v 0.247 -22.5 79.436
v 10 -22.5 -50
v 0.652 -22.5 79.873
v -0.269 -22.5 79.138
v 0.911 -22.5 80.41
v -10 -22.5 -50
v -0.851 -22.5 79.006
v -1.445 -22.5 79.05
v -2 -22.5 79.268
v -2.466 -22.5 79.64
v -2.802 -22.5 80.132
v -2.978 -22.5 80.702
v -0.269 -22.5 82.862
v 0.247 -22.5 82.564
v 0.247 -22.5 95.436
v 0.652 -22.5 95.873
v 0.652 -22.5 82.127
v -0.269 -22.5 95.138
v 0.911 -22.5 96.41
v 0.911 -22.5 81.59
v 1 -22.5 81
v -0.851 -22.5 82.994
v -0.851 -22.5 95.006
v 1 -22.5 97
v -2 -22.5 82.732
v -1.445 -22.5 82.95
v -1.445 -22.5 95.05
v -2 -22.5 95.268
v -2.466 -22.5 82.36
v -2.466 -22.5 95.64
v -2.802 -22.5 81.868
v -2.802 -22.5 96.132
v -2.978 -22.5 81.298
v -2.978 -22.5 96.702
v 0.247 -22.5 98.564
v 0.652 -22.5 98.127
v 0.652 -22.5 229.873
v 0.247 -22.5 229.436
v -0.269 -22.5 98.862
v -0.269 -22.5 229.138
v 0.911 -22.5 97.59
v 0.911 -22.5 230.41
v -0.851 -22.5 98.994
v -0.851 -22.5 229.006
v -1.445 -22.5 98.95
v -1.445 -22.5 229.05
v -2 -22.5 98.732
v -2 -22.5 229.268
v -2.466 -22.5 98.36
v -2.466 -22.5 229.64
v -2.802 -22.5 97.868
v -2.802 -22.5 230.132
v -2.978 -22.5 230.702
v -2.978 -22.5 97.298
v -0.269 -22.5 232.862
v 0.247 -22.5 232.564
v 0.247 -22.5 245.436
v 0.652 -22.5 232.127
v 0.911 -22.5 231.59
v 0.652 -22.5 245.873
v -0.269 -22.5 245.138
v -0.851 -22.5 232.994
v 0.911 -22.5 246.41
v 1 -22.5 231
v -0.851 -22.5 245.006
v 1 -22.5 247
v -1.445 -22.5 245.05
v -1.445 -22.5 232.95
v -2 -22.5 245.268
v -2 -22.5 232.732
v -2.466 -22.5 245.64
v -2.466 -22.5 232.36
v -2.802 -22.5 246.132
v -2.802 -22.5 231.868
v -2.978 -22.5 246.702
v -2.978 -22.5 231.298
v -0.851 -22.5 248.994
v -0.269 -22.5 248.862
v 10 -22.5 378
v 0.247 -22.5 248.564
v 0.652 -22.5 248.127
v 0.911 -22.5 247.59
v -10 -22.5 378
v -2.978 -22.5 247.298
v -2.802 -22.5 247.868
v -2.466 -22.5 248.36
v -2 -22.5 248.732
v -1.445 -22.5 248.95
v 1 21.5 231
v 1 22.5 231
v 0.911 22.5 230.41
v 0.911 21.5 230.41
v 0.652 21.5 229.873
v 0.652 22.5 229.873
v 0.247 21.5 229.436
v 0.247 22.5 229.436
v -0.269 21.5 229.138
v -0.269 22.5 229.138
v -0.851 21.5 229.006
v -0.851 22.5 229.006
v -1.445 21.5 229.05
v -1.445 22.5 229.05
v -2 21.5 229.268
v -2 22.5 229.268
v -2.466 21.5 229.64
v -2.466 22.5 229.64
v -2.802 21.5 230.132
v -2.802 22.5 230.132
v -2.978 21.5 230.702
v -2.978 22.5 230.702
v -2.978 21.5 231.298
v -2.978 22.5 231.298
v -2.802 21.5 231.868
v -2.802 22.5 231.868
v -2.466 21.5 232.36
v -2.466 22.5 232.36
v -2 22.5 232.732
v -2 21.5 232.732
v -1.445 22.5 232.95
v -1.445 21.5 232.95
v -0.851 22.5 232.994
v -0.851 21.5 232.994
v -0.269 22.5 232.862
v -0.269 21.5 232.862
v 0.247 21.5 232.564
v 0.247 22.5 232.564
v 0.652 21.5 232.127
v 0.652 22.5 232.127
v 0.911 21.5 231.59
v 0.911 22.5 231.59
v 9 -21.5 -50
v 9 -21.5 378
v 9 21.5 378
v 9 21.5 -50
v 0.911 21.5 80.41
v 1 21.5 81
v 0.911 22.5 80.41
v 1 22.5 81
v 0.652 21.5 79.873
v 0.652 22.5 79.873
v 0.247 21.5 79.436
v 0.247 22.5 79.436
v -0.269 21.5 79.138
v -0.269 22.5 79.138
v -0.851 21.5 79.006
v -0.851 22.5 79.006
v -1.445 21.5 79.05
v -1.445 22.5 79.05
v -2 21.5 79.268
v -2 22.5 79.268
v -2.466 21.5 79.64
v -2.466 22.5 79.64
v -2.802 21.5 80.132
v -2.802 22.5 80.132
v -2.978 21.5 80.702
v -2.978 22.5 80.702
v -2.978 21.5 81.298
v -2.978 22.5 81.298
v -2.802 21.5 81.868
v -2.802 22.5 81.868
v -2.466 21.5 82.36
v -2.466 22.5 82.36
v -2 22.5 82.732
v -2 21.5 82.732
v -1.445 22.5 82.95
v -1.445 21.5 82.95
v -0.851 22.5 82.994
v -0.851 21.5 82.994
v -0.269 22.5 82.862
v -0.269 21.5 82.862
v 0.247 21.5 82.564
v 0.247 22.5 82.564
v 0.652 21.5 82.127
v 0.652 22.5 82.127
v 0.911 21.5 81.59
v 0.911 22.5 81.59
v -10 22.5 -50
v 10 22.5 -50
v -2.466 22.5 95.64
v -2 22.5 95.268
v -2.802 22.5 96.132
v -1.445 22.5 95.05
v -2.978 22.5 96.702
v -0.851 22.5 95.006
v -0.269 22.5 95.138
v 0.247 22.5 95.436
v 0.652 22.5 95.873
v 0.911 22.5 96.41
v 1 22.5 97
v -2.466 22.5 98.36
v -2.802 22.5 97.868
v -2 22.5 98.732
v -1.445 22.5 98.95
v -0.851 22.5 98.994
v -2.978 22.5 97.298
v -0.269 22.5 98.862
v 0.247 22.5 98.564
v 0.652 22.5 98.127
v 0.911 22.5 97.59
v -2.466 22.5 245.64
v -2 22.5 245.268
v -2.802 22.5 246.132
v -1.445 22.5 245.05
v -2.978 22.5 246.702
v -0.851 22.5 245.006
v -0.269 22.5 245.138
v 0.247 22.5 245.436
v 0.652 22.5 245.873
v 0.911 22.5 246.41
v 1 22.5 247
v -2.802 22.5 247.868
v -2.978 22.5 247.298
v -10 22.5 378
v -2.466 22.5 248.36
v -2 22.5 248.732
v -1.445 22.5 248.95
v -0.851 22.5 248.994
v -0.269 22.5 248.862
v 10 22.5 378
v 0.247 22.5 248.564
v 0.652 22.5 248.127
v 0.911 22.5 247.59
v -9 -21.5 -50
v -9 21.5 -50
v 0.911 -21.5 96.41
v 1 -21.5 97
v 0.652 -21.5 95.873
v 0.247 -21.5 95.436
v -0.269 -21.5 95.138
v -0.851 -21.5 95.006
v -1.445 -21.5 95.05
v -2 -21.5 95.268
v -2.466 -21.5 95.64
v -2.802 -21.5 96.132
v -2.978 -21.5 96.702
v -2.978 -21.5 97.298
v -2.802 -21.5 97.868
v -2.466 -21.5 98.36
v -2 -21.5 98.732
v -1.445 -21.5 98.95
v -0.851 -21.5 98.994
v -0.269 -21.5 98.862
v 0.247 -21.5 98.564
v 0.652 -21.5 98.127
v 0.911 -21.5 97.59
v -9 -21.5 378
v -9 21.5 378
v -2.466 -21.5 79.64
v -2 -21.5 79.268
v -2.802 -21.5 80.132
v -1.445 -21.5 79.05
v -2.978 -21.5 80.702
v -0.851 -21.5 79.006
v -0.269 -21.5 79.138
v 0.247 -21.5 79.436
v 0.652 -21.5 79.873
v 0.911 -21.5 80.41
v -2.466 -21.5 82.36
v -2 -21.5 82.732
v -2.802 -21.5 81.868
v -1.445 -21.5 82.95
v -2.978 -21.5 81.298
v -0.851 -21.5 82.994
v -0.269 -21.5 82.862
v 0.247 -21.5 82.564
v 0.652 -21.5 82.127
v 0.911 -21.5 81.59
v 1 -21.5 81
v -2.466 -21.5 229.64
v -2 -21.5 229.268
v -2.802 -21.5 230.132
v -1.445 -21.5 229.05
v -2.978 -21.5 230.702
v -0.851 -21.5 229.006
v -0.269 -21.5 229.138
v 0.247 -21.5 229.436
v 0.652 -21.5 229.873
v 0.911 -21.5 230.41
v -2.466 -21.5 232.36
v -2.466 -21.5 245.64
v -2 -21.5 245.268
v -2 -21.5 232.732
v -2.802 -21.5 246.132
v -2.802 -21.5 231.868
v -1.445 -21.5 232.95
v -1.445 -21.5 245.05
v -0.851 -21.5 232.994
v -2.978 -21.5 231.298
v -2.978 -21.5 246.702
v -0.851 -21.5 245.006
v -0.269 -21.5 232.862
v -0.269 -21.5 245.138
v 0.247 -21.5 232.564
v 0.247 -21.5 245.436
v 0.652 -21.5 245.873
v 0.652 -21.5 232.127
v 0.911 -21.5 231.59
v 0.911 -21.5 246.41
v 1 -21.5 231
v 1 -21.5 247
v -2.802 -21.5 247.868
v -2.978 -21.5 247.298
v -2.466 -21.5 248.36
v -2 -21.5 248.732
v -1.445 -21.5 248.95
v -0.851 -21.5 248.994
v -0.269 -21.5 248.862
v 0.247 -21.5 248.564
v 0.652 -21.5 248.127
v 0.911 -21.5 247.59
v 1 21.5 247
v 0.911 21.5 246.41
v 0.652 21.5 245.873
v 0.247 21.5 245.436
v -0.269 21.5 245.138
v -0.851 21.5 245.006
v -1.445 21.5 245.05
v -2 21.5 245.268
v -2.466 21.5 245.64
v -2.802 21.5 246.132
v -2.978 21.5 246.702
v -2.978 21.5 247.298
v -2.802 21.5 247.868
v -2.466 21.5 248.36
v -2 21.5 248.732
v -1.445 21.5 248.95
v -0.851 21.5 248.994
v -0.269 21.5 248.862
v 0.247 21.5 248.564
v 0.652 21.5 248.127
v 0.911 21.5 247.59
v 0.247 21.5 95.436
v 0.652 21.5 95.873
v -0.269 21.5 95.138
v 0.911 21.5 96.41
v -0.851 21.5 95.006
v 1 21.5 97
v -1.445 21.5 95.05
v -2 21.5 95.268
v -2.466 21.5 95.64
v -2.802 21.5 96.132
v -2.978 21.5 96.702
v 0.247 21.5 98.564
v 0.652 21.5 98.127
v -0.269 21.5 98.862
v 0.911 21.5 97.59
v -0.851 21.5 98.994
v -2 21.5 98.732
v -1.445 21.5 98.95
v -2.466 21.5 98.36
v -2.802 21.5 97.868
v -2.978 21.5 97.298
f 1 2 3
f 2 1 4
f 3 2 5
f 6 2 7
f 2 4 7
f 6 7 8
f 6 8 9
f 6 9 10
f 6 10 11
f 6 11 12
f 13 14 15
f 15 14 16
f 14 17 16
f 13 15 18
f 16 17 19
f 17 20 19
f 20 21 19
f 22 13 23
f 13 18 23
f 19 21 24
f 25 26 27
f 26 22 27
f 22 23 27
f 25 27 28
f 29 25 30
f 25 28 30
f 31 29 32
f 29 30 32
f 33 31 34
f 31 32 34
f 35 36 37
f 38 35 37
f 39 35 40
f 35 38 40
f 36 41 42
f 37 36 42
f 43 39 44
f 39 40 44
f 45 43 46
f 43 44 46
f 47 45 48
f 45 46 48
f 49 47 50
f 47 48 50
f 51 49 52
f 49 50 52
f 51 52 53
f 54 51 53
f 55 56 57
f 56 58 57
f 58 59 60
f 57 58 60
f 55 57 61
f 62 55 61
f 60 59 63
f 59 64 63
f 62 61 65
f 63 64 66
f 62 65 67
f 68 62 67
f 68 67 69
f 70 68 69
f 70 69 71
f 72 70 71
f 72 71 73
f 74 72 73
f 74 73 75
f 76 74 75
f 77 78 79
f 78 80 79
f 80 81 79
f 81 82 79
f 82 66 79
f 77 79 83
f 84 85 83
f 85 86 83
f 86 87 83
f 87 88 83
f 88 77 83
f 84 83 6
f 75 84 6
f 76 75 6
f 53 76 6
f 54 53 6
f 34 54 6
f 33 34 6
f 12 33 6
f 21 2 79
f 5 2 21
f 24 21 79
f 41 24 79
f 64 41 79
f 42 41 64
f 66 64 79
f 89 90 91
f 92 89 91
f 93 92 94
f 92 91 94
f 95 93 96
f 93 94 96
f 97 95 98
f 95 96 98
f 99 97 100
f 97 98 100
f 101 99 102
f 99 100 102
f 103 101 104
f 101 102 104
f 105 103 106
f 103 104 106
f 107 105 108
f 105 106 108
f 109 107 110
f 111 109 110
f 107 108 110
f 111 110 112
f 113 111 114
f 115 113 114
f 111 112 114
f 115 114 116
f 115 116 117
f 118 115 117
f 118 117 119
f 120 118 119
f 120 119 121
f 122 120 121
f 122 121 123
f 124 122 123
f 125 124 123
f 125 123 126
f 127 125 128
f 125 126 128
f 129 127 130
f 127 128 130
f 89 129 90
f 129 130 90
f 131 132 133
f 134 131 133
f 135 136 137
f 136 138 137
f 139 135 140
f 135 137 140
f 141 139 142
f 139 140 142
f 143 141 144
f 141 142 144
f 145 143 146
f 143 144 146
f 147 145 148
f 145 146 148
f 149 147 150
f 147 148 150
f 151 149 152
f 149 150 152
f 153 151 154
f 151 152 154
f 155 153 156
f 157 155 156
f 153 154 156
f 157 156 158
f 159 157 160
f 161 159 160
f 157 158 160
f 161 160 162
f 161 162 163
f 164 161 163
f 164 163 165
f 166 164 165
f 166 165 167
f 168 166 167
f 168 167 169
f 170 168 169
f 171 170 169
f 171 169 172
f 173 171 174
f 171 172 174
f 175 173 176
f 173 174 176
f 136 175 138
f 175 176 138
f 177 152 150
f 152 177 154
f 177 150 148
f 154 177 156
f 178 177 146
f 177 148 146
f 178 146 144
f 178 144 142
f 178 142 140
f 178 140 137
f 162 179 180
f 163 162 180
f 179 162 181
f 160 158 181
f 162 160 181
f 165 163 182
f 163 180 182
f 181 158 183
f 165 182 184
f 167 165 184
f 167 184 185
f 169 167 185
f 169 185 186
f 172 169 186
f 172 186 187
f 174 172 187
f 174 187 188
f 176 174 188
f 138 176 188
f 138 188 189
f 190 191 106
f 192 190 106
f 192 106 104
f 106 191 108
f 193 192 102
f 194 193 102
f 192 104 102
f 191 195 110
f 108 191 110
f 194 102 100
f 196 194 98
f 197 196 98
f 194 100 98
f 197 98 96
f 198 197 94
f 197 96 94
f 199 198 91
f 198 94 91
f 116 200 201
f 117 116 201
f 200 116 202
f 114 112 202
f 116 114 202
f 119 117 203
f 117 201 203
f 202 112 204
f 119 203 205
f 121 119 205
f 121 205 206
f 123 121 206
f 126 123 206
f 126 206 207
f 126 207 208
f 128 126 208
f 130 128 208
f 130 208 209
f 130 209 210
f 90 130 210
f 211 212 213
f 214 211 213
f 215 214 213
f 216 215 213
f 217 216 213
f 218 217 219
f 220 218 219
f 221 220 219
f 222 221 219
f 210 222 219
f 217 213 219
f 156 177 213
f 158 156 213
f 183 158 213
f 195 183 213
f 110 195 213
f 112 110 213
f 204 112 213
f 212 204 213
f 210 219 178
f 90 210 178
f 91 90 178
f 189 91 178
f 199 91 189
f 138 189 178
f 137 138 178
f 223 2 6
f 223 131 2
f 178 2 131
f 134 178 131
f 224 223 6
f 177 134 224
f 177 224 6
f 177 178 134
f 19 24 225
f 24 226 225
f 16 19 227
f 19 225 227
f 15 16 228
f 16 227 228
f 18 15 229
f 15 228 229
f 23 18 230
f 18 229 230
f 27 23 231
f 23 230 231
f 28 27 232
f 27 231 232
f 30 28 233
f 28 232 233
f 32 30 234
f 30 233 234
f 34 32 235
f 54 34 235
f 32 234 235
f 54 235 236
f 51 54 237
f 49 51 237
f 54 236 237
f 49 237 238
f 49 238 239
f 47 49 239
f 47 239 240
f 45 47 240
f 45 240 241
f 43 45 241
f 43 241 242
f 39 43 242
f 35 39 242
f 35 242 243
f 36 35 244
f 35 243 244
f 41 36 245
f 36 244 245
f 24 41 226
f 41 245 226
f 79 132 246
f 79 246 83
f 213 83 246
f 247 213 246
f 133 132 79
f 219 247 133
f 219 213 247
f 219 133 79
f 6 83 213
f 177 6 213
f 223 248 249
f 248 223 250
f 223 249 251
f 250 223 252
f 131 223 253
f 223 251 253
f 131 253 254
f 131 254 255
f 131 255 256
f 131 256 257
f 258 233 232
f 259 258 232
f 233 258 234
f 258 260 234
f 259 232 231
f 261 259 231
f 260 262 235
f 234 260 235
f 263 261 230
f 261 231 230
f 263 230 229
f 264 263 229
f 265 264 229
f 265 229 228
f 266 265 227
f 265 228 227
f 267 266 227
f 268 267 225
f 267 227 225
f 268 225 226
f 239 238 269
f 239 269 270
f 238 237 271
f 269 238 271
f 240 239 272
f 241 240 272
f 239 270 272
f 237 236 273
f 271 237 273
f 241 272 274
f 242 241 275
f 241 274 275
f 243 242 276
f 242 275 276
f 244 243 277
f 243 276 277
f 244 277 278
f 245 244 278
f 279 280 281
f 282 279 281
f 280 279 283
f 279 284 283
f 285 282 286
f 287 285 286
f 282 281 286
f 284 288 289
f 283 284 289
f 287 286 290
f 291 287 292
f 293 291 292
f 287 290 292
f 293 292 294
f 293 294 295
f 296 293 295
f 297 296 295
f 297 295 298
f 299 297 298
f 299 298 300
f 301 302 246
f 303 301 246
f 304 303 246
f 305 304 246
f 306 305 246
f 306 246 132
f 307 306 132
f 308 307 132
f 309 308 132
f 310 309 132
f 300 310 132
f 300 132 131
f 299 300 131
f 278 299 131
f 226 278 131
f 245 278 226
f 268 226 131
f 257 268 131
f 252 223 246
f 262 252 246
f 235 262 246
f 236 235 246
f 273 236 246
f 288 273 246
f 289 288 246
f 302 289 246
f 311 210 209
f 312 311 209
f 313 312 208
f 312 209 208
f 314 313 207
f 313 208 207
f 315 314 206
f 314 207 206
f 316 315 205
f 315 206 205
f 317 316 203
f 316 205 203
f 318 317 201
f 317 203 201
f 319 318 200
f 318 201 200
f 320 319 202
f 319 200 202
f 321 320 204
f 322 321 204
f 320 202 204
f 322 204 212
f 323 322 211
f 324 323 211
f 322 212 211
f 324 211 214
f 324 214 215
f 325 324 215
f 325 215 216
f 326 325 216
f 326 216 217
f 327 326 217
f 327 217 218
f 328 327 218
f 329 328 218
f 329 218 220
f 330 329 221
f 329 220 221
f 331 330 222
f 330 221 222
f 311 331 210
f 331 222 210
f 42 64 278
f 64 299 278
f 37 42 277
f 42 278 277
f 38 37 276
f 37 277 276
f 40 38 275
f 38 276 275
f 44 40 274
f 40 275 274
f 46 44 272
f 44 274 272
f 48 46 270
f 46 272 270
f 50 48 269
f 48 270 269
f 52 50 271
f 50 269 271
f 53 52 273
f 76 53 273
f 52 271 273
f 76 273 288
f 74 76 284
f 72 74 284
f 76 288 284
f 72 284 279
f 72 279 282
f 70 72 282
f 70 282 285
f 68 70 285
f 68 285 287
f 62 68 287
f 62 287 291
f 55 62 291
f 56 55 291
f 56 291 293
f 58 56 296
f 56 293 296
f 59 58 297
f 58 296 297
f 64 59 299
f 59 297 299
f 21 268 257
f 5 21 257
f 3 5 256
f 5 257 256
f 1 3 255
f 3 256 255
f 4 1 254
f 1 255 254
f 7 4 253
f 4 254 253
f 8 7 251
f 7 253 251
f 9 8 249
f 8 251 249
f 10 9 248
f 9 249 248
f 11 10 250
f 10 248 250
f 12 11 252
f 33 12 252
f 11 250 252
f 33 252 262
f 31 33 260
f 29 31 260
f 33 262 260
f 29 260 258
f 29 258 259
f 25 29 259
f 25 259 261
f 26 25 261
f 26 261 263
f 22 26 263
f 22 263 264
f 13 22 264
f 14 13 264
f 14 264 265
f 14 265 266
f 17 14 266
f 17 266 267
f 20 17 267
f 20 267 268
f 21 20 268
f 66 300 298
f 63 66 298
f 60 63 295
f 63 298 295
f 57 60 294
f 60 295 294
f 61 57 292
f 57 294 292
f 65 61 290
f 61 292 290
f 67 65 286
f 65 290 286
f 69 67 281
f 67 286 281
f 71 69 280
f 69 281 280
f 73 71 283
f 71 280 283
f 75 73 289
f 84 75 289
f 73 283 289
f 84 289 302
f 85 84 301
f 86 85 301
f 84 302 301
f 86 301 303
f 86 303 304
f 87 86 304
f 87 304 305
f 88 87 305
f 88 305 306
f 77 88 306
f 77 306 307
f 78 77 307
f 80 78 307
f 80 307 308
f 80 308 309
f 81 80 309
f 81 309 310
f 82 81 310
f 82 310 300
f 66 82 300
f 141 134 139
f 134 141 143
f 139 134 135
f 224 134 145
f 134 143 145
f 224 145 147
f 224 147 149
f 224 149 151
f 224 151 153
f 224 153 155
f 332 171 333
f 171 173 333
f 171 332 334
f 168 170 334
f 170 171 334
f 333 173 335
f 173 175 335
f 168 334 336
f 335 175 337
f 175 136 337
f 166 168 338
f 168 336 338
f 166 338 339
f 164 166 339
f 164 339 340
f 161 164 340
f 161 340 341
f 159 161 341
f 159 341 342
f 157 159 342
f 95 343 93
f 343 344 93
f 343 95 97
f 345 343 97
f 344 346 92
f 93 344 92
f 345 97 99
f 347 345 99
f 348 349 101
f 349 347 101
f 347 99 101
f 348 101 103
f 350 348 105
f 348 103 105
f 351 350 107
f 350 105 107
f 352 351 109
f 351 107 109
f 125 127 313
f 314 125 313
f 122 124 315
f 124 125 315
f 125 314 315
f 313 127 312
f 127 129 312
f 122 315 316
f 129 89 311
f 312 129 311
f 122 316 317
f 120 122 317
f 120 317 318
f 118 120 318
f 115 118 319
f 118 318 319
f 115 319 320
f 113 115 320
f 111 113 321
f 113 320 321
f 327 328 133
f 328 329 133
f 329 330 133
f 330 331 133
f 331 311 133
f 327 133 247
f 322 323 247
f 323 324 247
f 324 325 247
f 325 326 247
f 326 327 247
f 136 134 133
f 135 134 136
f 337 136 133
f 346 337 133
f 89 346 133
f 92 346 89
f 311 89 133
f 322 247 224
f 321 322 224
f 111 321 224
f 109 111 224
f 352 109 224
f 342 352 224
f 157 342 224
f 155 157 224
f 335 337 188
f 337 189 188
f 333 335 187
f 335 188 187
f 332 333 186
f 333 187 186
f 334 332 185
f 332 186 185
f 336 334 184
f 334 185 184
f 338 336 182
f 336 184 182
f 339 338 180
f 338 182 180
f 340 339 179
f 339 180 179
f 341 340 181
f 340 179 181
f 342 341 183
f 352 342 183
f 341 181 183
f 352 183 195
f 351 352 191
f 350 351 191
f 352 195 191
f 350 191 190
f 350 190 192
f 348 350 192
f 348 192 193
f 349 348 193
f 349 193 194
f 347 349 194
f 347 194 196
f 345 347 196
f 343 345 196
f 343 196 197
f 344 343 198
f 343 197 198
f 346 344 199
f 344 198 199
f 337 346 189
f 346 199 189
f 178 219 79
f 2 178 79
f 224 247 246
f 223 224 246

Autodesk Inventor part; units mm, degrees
ref_plane "YZ Plane" through (0, 0, 0) normal (1, 0, 0) x (0, 1, 0)
ref_plane "XZ Plane" through (0, 0, 0) normal (0, 1, 0) x (-1, 0, 0)
ref_plane "XY Plane" through (0, 0, 0) normal (0, 0, 1) x (1, 0, 0)
sketch "草图1" plane through (0, 0, 0) normal (0, 0, 1) x (1, 0, 0)
  line L0 (10, -22.5) -> (-10, -22.5)
  line L1 (-10, -22.5) -> (-10, 22.5)
  line L2 (-10, 22.5) -> (10, 22.5)
  line L3 (10, 22.5) -> (10, -22.5)
  line L4 (10, -22.5) -> (-10, 22.5) construction
  line L5 (-10, -22.5) -> (10, 22.5) construction
  line L6 (9, 21.5) -> (-9, 21.5)
  line L7 (-9, 21.5) -> (-9, -21.5)
  line L8 (-9, -21.5) -> (9, -21.5)
  line L9 (9, -21.5) -> (9, 21.5)
  point P0 (0, 0)
  dimension "d0" = 45
  dimension "d1" = 20
  dimension "d4" = 1
extrude "拉伸1" add sketch "草图1" along normal blind 328
sketch "草图4" plane through (-10, 22.5, 0) normal (0, 1, 0) x (1, 0, 0)
  circle A0 centre (9, -81) radius 2
  circle A1 centre (9, -97) radius 2
  line L0 (0, 0) -> (0, -328) projected
  line L1 (20, 0) -> (0, 0) projected
  line L2 (0, -164) -> (-22.908, -164)
  circle A2 centre (9, -247) radius 2
  circle A3 centre (9, -231) radius 2
  point P0 (10, 0)
  dimension "d5" = 9
  dimension "d6" = 16
  dimension "d7" = 81
extrude "拉伸2" cut sketch "草图4" against normal blind 58.75
sketch "草图5" plane through (0, 0, 328) normal (0, 0, 1) x (1, 0, 0)
  line L0 (10, 22.5) -> (-10, 22.5) projected
  line L1 (-10, 22.5) -> (-10, -22.5) projected
  line L2 (-10, -22.5) -> (10, -22.5) projected
  line L3 (10, -22.5) -> (10, 22.5) projected
  line L4 (9, 21.5) -> (9, -21.5) projected
  line L5 (9, -21.5) -> (-9, -21.5) projected
  line L6 (-9, -21.5) -> (-9, 21.5) projected
  line L7 (-9, 21.5) -> (9, 21.5) projected
  point P0 (0, 0)
ref_plane "工作平面1" through (0, 0, 164) normal (0, 0, 1) x (1, 0, 0)
extrude "拉伸3" add sketch "草图5" along normal blind 50
mirror "镜像1" about plane through (0, 0, 164) normal (0, 0, 1) of "拉伸3"
properties part number "321x30"
